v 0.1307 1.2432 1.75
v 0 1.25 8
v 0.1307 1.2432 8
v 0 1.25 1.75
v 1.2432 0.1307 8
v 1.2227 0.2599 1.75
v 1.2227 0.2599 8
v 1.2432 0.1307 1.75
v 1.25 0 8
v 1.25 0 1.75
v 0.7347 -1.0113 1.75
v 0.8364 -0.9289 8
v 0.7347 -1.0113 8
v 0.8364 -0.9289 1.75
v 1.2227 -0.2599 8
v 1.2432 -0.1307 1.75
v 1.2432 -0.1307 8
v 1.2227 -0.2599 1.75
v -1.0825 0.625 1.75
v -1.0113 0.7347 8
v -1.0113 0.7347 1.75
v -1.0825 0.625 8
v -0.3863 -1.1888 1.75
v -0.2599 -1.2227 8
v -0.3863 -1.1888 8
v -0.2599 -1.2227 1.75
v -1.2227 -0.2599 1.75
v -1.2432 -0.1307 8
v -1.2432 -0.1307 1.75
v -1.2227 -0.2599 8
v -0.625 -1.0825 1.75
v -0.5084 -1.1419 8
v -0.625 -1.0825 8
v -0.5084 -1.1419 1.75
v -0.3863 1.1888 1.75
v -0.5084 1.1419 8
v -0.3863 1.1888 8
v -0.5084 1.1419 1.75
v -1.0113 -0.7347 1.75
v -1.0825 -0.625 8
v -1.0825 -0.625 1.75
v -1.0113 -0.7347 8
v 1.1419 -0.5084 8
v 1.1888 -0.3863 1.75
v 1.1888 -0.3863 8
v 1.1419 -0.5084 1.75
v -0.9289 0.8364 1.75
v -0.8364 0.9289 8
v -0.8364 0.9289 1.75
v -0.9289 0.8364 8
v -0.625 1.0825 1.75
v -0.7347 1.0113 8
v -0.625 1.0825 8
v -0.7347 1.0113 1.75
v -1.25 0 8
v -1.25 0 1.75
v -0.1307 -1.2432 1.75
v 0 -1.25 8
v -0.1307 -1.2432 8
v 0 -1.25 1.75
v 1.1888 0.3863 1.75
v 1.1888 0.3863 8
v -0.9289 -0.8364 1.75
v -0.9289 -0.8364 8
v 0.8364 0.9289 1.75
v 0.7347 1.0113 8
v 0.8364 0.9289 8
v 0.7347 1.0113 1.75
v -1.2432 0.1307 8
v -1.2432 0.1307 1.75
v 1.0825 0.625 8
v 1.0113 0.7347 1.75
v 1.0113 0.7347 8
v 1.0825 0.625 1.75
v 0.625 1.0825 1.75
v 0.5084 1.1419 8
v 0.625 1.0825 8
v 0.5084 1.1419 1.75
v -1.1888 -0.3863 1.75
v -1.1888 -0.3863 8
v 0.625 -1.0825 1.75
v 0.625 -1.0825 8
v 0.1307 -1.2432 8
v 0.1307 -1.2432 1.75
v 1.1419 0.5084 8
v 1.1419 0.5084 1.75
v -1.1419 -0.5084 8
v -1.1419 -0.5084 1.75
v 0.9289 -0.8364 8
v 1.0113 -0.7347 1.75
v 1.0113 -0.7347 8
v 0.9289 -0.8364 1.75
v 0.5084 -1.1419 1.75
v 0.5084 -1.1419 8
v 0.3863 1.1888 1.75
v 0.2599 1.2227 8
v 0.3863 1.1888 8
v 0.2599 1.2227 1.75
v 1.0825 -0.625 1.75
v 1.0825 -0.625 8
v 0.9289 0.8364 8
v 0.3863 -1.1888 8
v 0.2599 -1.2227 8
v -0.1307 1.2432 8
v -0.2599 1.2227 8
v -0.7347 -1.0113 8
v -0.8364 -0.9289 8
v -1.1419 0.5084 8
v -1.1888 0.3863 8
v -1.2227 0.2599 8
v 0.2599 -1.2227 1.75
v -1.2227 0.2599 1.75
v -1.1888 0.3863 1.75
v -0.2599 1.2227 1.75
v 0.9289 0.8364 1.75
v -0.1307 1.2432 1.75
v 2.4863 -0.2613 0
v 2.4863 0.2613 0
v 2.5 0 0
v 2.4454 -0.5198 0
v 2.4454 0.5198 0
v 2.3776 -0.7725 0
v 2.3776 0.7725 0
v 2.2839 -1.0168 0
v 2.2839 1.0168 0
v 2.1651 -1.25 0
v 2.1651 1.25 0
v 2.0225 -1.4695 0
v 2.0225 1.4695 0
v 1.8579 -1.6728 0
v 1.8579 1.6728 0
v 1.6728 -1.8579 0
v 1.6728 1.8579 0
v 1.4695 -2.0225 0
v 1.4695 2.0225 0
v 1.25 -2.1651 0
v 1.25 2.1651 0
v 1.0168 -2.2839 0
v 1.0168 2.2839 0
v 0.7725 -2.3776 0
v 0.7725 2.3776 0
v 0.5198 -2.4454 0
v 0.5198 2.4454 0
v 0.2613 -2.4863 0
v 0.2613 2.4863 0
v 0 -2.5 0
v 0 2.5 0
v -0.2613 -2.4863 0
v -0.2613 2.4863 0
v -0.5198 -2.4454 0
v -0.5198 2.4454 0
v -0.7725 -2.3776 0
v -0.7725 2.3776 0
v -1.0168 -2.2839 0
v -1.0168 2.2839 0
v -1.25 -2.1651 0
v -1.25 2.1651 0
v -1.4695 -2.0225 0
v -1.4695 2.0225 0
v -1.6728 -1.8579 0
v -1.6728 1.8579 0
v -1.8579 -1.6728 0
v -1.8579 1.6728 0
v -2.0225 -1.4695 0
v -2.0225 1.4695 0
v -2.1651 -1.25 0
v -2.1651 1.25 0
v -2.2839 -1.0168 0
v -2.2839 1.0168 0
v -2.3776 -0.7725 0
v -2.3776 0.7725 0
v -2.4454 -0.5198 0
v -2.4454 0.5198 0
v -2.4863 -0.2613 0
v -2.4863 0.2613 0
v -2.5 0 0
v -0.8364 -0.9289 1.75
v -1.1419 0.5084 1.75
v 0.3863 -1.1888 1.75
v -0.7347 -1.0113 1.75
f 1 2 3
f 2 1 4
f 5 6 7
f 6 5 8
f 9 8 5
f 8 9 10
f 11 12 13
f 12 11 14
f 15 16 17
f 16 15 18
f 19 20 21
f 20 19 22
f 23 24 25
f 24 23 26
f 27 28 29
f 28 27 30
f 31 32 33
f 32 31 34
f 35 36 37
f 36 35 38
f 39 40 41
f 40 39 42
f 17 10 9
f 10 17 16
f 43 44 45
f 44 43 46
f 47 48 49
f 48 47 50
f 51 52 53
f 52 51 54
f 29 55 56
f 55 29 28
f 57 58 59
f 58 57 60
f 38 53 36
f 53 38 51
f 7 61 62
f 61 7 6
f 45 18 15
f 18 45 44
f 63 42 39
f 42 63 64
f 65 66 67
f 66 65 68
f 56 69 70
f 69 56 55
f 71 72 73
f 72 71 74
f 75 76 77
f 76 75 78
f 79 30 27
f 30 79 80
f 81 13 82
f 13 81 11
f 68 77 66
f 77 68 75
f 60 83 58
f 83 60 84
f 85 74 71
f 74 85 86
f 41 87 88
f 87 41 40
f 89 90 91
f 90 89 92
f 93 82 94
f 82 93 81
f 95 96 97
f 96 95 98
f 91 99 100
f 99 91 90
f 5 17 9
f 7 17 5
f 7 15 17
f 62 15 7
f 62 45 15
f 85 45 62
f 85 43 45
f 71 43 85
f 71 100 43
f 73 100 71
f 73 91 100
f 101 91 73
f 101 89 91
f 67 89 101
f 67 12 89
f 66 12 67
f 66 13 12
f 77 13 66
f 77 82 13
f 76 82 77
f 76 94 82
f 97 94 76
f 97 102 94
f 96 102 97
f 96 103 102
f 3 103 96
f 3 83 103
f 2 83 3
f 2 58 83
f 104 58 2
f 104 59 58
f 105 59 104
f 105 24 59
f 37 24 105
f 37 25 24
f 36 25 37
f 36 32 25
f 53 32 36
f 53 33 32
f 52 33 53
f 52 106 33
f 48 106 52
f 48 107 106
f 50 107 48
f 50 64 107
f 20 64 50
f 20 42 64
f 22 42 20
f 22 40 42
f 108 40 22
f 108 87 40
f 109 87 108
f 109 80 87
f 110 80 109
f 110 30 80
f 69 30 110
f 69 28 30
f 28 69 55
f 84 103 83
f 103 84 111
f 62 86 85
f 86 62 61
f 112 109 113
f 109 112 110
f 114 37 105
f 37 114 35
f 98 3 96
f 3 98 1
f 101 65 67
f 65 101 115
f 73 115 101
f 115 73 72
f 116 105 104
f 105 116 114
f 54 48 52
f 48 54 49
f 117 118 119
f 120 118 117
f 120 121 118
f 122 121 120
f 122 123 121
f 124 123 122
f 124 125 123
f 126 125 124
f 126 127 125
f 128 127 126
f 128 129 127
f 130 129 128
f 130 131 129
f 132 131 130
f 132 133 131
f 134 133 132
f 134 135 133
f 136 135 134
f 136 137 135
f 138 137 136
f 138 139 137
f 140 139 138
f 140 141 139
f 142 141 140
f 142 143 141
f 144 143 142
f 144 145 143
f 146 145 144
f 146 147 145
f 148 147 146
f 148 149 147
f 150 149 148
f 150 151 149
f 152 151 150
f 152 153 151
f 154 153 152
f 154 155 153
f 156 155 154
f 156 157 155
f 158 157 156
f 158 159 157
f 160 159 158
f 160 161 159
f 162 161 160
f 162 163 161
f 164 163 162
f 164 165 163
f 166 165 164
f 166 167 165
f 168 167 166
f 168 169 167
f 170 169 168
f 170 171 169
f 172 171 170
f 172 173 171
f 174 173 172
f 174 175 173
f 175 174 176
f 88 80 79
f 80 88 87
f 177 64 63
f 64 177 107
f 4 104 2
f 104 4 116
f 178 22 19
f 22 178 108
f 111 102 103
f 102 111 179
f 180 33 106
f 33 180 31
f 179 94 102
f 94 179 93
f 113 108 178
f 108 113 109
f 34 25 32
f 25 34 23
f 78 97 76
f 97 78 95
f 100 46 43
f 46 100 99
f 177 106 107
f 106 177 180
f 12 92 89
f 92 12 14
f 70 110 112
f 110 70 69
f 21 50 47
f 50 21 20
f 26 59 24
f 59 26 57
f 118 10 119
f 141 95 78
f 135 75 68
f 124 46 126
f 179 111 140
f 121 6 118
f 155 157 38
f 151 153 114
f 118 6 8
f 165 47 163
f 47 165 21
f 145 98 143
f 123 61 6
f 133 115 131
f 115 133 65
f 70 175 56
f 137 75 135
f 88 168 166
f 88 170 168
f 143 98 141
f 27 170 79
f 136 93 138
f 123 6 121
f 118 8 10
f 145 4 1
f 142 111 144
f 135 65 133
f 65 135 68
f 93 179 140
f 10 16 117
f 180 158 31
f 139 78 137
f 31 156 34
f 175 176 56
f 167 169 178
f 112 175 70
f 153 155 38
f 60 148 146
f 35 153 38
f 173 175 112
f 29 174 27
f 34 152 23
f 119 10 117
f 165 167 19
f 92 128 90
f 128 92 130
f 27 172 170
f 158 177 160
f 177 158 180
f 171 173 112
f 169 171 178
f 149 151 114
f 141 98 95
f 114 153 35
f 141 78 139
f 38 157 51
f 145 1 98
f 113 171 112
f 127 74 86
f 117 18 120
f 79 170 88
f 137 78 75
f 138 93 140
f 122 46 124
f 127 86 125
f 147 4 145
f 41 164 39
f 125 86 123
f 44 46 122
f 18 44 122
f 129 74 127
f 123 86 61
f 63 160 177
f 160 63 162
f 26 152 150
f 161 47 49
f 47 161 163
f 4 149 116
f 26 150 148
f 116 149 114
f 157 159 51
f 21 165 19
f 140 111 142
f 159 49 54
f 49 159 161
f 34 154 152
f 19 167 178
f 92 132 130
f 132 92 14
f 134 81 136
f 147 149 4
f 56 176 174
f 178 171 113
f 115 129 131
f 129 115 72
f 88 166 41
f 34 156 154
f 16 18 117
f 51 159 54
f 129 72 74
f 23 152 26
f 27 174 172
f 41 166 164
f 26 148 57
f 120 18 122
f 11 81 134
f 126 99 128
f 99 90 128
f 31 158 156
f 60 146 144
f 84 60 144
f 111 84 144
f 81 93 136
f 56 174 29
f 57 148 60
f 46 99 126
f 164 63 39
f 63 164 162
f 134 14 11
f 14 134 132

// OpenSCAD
// Solid rivet.
$fn = 60;
eps = 0.02;
shank_d = 2.5;
head_d = 5;
length = 8;
union() { cylinder(d=shank_d,h=length); cylinder(d1=head_d,d2=shank_d,h=head_d*0.35); }
